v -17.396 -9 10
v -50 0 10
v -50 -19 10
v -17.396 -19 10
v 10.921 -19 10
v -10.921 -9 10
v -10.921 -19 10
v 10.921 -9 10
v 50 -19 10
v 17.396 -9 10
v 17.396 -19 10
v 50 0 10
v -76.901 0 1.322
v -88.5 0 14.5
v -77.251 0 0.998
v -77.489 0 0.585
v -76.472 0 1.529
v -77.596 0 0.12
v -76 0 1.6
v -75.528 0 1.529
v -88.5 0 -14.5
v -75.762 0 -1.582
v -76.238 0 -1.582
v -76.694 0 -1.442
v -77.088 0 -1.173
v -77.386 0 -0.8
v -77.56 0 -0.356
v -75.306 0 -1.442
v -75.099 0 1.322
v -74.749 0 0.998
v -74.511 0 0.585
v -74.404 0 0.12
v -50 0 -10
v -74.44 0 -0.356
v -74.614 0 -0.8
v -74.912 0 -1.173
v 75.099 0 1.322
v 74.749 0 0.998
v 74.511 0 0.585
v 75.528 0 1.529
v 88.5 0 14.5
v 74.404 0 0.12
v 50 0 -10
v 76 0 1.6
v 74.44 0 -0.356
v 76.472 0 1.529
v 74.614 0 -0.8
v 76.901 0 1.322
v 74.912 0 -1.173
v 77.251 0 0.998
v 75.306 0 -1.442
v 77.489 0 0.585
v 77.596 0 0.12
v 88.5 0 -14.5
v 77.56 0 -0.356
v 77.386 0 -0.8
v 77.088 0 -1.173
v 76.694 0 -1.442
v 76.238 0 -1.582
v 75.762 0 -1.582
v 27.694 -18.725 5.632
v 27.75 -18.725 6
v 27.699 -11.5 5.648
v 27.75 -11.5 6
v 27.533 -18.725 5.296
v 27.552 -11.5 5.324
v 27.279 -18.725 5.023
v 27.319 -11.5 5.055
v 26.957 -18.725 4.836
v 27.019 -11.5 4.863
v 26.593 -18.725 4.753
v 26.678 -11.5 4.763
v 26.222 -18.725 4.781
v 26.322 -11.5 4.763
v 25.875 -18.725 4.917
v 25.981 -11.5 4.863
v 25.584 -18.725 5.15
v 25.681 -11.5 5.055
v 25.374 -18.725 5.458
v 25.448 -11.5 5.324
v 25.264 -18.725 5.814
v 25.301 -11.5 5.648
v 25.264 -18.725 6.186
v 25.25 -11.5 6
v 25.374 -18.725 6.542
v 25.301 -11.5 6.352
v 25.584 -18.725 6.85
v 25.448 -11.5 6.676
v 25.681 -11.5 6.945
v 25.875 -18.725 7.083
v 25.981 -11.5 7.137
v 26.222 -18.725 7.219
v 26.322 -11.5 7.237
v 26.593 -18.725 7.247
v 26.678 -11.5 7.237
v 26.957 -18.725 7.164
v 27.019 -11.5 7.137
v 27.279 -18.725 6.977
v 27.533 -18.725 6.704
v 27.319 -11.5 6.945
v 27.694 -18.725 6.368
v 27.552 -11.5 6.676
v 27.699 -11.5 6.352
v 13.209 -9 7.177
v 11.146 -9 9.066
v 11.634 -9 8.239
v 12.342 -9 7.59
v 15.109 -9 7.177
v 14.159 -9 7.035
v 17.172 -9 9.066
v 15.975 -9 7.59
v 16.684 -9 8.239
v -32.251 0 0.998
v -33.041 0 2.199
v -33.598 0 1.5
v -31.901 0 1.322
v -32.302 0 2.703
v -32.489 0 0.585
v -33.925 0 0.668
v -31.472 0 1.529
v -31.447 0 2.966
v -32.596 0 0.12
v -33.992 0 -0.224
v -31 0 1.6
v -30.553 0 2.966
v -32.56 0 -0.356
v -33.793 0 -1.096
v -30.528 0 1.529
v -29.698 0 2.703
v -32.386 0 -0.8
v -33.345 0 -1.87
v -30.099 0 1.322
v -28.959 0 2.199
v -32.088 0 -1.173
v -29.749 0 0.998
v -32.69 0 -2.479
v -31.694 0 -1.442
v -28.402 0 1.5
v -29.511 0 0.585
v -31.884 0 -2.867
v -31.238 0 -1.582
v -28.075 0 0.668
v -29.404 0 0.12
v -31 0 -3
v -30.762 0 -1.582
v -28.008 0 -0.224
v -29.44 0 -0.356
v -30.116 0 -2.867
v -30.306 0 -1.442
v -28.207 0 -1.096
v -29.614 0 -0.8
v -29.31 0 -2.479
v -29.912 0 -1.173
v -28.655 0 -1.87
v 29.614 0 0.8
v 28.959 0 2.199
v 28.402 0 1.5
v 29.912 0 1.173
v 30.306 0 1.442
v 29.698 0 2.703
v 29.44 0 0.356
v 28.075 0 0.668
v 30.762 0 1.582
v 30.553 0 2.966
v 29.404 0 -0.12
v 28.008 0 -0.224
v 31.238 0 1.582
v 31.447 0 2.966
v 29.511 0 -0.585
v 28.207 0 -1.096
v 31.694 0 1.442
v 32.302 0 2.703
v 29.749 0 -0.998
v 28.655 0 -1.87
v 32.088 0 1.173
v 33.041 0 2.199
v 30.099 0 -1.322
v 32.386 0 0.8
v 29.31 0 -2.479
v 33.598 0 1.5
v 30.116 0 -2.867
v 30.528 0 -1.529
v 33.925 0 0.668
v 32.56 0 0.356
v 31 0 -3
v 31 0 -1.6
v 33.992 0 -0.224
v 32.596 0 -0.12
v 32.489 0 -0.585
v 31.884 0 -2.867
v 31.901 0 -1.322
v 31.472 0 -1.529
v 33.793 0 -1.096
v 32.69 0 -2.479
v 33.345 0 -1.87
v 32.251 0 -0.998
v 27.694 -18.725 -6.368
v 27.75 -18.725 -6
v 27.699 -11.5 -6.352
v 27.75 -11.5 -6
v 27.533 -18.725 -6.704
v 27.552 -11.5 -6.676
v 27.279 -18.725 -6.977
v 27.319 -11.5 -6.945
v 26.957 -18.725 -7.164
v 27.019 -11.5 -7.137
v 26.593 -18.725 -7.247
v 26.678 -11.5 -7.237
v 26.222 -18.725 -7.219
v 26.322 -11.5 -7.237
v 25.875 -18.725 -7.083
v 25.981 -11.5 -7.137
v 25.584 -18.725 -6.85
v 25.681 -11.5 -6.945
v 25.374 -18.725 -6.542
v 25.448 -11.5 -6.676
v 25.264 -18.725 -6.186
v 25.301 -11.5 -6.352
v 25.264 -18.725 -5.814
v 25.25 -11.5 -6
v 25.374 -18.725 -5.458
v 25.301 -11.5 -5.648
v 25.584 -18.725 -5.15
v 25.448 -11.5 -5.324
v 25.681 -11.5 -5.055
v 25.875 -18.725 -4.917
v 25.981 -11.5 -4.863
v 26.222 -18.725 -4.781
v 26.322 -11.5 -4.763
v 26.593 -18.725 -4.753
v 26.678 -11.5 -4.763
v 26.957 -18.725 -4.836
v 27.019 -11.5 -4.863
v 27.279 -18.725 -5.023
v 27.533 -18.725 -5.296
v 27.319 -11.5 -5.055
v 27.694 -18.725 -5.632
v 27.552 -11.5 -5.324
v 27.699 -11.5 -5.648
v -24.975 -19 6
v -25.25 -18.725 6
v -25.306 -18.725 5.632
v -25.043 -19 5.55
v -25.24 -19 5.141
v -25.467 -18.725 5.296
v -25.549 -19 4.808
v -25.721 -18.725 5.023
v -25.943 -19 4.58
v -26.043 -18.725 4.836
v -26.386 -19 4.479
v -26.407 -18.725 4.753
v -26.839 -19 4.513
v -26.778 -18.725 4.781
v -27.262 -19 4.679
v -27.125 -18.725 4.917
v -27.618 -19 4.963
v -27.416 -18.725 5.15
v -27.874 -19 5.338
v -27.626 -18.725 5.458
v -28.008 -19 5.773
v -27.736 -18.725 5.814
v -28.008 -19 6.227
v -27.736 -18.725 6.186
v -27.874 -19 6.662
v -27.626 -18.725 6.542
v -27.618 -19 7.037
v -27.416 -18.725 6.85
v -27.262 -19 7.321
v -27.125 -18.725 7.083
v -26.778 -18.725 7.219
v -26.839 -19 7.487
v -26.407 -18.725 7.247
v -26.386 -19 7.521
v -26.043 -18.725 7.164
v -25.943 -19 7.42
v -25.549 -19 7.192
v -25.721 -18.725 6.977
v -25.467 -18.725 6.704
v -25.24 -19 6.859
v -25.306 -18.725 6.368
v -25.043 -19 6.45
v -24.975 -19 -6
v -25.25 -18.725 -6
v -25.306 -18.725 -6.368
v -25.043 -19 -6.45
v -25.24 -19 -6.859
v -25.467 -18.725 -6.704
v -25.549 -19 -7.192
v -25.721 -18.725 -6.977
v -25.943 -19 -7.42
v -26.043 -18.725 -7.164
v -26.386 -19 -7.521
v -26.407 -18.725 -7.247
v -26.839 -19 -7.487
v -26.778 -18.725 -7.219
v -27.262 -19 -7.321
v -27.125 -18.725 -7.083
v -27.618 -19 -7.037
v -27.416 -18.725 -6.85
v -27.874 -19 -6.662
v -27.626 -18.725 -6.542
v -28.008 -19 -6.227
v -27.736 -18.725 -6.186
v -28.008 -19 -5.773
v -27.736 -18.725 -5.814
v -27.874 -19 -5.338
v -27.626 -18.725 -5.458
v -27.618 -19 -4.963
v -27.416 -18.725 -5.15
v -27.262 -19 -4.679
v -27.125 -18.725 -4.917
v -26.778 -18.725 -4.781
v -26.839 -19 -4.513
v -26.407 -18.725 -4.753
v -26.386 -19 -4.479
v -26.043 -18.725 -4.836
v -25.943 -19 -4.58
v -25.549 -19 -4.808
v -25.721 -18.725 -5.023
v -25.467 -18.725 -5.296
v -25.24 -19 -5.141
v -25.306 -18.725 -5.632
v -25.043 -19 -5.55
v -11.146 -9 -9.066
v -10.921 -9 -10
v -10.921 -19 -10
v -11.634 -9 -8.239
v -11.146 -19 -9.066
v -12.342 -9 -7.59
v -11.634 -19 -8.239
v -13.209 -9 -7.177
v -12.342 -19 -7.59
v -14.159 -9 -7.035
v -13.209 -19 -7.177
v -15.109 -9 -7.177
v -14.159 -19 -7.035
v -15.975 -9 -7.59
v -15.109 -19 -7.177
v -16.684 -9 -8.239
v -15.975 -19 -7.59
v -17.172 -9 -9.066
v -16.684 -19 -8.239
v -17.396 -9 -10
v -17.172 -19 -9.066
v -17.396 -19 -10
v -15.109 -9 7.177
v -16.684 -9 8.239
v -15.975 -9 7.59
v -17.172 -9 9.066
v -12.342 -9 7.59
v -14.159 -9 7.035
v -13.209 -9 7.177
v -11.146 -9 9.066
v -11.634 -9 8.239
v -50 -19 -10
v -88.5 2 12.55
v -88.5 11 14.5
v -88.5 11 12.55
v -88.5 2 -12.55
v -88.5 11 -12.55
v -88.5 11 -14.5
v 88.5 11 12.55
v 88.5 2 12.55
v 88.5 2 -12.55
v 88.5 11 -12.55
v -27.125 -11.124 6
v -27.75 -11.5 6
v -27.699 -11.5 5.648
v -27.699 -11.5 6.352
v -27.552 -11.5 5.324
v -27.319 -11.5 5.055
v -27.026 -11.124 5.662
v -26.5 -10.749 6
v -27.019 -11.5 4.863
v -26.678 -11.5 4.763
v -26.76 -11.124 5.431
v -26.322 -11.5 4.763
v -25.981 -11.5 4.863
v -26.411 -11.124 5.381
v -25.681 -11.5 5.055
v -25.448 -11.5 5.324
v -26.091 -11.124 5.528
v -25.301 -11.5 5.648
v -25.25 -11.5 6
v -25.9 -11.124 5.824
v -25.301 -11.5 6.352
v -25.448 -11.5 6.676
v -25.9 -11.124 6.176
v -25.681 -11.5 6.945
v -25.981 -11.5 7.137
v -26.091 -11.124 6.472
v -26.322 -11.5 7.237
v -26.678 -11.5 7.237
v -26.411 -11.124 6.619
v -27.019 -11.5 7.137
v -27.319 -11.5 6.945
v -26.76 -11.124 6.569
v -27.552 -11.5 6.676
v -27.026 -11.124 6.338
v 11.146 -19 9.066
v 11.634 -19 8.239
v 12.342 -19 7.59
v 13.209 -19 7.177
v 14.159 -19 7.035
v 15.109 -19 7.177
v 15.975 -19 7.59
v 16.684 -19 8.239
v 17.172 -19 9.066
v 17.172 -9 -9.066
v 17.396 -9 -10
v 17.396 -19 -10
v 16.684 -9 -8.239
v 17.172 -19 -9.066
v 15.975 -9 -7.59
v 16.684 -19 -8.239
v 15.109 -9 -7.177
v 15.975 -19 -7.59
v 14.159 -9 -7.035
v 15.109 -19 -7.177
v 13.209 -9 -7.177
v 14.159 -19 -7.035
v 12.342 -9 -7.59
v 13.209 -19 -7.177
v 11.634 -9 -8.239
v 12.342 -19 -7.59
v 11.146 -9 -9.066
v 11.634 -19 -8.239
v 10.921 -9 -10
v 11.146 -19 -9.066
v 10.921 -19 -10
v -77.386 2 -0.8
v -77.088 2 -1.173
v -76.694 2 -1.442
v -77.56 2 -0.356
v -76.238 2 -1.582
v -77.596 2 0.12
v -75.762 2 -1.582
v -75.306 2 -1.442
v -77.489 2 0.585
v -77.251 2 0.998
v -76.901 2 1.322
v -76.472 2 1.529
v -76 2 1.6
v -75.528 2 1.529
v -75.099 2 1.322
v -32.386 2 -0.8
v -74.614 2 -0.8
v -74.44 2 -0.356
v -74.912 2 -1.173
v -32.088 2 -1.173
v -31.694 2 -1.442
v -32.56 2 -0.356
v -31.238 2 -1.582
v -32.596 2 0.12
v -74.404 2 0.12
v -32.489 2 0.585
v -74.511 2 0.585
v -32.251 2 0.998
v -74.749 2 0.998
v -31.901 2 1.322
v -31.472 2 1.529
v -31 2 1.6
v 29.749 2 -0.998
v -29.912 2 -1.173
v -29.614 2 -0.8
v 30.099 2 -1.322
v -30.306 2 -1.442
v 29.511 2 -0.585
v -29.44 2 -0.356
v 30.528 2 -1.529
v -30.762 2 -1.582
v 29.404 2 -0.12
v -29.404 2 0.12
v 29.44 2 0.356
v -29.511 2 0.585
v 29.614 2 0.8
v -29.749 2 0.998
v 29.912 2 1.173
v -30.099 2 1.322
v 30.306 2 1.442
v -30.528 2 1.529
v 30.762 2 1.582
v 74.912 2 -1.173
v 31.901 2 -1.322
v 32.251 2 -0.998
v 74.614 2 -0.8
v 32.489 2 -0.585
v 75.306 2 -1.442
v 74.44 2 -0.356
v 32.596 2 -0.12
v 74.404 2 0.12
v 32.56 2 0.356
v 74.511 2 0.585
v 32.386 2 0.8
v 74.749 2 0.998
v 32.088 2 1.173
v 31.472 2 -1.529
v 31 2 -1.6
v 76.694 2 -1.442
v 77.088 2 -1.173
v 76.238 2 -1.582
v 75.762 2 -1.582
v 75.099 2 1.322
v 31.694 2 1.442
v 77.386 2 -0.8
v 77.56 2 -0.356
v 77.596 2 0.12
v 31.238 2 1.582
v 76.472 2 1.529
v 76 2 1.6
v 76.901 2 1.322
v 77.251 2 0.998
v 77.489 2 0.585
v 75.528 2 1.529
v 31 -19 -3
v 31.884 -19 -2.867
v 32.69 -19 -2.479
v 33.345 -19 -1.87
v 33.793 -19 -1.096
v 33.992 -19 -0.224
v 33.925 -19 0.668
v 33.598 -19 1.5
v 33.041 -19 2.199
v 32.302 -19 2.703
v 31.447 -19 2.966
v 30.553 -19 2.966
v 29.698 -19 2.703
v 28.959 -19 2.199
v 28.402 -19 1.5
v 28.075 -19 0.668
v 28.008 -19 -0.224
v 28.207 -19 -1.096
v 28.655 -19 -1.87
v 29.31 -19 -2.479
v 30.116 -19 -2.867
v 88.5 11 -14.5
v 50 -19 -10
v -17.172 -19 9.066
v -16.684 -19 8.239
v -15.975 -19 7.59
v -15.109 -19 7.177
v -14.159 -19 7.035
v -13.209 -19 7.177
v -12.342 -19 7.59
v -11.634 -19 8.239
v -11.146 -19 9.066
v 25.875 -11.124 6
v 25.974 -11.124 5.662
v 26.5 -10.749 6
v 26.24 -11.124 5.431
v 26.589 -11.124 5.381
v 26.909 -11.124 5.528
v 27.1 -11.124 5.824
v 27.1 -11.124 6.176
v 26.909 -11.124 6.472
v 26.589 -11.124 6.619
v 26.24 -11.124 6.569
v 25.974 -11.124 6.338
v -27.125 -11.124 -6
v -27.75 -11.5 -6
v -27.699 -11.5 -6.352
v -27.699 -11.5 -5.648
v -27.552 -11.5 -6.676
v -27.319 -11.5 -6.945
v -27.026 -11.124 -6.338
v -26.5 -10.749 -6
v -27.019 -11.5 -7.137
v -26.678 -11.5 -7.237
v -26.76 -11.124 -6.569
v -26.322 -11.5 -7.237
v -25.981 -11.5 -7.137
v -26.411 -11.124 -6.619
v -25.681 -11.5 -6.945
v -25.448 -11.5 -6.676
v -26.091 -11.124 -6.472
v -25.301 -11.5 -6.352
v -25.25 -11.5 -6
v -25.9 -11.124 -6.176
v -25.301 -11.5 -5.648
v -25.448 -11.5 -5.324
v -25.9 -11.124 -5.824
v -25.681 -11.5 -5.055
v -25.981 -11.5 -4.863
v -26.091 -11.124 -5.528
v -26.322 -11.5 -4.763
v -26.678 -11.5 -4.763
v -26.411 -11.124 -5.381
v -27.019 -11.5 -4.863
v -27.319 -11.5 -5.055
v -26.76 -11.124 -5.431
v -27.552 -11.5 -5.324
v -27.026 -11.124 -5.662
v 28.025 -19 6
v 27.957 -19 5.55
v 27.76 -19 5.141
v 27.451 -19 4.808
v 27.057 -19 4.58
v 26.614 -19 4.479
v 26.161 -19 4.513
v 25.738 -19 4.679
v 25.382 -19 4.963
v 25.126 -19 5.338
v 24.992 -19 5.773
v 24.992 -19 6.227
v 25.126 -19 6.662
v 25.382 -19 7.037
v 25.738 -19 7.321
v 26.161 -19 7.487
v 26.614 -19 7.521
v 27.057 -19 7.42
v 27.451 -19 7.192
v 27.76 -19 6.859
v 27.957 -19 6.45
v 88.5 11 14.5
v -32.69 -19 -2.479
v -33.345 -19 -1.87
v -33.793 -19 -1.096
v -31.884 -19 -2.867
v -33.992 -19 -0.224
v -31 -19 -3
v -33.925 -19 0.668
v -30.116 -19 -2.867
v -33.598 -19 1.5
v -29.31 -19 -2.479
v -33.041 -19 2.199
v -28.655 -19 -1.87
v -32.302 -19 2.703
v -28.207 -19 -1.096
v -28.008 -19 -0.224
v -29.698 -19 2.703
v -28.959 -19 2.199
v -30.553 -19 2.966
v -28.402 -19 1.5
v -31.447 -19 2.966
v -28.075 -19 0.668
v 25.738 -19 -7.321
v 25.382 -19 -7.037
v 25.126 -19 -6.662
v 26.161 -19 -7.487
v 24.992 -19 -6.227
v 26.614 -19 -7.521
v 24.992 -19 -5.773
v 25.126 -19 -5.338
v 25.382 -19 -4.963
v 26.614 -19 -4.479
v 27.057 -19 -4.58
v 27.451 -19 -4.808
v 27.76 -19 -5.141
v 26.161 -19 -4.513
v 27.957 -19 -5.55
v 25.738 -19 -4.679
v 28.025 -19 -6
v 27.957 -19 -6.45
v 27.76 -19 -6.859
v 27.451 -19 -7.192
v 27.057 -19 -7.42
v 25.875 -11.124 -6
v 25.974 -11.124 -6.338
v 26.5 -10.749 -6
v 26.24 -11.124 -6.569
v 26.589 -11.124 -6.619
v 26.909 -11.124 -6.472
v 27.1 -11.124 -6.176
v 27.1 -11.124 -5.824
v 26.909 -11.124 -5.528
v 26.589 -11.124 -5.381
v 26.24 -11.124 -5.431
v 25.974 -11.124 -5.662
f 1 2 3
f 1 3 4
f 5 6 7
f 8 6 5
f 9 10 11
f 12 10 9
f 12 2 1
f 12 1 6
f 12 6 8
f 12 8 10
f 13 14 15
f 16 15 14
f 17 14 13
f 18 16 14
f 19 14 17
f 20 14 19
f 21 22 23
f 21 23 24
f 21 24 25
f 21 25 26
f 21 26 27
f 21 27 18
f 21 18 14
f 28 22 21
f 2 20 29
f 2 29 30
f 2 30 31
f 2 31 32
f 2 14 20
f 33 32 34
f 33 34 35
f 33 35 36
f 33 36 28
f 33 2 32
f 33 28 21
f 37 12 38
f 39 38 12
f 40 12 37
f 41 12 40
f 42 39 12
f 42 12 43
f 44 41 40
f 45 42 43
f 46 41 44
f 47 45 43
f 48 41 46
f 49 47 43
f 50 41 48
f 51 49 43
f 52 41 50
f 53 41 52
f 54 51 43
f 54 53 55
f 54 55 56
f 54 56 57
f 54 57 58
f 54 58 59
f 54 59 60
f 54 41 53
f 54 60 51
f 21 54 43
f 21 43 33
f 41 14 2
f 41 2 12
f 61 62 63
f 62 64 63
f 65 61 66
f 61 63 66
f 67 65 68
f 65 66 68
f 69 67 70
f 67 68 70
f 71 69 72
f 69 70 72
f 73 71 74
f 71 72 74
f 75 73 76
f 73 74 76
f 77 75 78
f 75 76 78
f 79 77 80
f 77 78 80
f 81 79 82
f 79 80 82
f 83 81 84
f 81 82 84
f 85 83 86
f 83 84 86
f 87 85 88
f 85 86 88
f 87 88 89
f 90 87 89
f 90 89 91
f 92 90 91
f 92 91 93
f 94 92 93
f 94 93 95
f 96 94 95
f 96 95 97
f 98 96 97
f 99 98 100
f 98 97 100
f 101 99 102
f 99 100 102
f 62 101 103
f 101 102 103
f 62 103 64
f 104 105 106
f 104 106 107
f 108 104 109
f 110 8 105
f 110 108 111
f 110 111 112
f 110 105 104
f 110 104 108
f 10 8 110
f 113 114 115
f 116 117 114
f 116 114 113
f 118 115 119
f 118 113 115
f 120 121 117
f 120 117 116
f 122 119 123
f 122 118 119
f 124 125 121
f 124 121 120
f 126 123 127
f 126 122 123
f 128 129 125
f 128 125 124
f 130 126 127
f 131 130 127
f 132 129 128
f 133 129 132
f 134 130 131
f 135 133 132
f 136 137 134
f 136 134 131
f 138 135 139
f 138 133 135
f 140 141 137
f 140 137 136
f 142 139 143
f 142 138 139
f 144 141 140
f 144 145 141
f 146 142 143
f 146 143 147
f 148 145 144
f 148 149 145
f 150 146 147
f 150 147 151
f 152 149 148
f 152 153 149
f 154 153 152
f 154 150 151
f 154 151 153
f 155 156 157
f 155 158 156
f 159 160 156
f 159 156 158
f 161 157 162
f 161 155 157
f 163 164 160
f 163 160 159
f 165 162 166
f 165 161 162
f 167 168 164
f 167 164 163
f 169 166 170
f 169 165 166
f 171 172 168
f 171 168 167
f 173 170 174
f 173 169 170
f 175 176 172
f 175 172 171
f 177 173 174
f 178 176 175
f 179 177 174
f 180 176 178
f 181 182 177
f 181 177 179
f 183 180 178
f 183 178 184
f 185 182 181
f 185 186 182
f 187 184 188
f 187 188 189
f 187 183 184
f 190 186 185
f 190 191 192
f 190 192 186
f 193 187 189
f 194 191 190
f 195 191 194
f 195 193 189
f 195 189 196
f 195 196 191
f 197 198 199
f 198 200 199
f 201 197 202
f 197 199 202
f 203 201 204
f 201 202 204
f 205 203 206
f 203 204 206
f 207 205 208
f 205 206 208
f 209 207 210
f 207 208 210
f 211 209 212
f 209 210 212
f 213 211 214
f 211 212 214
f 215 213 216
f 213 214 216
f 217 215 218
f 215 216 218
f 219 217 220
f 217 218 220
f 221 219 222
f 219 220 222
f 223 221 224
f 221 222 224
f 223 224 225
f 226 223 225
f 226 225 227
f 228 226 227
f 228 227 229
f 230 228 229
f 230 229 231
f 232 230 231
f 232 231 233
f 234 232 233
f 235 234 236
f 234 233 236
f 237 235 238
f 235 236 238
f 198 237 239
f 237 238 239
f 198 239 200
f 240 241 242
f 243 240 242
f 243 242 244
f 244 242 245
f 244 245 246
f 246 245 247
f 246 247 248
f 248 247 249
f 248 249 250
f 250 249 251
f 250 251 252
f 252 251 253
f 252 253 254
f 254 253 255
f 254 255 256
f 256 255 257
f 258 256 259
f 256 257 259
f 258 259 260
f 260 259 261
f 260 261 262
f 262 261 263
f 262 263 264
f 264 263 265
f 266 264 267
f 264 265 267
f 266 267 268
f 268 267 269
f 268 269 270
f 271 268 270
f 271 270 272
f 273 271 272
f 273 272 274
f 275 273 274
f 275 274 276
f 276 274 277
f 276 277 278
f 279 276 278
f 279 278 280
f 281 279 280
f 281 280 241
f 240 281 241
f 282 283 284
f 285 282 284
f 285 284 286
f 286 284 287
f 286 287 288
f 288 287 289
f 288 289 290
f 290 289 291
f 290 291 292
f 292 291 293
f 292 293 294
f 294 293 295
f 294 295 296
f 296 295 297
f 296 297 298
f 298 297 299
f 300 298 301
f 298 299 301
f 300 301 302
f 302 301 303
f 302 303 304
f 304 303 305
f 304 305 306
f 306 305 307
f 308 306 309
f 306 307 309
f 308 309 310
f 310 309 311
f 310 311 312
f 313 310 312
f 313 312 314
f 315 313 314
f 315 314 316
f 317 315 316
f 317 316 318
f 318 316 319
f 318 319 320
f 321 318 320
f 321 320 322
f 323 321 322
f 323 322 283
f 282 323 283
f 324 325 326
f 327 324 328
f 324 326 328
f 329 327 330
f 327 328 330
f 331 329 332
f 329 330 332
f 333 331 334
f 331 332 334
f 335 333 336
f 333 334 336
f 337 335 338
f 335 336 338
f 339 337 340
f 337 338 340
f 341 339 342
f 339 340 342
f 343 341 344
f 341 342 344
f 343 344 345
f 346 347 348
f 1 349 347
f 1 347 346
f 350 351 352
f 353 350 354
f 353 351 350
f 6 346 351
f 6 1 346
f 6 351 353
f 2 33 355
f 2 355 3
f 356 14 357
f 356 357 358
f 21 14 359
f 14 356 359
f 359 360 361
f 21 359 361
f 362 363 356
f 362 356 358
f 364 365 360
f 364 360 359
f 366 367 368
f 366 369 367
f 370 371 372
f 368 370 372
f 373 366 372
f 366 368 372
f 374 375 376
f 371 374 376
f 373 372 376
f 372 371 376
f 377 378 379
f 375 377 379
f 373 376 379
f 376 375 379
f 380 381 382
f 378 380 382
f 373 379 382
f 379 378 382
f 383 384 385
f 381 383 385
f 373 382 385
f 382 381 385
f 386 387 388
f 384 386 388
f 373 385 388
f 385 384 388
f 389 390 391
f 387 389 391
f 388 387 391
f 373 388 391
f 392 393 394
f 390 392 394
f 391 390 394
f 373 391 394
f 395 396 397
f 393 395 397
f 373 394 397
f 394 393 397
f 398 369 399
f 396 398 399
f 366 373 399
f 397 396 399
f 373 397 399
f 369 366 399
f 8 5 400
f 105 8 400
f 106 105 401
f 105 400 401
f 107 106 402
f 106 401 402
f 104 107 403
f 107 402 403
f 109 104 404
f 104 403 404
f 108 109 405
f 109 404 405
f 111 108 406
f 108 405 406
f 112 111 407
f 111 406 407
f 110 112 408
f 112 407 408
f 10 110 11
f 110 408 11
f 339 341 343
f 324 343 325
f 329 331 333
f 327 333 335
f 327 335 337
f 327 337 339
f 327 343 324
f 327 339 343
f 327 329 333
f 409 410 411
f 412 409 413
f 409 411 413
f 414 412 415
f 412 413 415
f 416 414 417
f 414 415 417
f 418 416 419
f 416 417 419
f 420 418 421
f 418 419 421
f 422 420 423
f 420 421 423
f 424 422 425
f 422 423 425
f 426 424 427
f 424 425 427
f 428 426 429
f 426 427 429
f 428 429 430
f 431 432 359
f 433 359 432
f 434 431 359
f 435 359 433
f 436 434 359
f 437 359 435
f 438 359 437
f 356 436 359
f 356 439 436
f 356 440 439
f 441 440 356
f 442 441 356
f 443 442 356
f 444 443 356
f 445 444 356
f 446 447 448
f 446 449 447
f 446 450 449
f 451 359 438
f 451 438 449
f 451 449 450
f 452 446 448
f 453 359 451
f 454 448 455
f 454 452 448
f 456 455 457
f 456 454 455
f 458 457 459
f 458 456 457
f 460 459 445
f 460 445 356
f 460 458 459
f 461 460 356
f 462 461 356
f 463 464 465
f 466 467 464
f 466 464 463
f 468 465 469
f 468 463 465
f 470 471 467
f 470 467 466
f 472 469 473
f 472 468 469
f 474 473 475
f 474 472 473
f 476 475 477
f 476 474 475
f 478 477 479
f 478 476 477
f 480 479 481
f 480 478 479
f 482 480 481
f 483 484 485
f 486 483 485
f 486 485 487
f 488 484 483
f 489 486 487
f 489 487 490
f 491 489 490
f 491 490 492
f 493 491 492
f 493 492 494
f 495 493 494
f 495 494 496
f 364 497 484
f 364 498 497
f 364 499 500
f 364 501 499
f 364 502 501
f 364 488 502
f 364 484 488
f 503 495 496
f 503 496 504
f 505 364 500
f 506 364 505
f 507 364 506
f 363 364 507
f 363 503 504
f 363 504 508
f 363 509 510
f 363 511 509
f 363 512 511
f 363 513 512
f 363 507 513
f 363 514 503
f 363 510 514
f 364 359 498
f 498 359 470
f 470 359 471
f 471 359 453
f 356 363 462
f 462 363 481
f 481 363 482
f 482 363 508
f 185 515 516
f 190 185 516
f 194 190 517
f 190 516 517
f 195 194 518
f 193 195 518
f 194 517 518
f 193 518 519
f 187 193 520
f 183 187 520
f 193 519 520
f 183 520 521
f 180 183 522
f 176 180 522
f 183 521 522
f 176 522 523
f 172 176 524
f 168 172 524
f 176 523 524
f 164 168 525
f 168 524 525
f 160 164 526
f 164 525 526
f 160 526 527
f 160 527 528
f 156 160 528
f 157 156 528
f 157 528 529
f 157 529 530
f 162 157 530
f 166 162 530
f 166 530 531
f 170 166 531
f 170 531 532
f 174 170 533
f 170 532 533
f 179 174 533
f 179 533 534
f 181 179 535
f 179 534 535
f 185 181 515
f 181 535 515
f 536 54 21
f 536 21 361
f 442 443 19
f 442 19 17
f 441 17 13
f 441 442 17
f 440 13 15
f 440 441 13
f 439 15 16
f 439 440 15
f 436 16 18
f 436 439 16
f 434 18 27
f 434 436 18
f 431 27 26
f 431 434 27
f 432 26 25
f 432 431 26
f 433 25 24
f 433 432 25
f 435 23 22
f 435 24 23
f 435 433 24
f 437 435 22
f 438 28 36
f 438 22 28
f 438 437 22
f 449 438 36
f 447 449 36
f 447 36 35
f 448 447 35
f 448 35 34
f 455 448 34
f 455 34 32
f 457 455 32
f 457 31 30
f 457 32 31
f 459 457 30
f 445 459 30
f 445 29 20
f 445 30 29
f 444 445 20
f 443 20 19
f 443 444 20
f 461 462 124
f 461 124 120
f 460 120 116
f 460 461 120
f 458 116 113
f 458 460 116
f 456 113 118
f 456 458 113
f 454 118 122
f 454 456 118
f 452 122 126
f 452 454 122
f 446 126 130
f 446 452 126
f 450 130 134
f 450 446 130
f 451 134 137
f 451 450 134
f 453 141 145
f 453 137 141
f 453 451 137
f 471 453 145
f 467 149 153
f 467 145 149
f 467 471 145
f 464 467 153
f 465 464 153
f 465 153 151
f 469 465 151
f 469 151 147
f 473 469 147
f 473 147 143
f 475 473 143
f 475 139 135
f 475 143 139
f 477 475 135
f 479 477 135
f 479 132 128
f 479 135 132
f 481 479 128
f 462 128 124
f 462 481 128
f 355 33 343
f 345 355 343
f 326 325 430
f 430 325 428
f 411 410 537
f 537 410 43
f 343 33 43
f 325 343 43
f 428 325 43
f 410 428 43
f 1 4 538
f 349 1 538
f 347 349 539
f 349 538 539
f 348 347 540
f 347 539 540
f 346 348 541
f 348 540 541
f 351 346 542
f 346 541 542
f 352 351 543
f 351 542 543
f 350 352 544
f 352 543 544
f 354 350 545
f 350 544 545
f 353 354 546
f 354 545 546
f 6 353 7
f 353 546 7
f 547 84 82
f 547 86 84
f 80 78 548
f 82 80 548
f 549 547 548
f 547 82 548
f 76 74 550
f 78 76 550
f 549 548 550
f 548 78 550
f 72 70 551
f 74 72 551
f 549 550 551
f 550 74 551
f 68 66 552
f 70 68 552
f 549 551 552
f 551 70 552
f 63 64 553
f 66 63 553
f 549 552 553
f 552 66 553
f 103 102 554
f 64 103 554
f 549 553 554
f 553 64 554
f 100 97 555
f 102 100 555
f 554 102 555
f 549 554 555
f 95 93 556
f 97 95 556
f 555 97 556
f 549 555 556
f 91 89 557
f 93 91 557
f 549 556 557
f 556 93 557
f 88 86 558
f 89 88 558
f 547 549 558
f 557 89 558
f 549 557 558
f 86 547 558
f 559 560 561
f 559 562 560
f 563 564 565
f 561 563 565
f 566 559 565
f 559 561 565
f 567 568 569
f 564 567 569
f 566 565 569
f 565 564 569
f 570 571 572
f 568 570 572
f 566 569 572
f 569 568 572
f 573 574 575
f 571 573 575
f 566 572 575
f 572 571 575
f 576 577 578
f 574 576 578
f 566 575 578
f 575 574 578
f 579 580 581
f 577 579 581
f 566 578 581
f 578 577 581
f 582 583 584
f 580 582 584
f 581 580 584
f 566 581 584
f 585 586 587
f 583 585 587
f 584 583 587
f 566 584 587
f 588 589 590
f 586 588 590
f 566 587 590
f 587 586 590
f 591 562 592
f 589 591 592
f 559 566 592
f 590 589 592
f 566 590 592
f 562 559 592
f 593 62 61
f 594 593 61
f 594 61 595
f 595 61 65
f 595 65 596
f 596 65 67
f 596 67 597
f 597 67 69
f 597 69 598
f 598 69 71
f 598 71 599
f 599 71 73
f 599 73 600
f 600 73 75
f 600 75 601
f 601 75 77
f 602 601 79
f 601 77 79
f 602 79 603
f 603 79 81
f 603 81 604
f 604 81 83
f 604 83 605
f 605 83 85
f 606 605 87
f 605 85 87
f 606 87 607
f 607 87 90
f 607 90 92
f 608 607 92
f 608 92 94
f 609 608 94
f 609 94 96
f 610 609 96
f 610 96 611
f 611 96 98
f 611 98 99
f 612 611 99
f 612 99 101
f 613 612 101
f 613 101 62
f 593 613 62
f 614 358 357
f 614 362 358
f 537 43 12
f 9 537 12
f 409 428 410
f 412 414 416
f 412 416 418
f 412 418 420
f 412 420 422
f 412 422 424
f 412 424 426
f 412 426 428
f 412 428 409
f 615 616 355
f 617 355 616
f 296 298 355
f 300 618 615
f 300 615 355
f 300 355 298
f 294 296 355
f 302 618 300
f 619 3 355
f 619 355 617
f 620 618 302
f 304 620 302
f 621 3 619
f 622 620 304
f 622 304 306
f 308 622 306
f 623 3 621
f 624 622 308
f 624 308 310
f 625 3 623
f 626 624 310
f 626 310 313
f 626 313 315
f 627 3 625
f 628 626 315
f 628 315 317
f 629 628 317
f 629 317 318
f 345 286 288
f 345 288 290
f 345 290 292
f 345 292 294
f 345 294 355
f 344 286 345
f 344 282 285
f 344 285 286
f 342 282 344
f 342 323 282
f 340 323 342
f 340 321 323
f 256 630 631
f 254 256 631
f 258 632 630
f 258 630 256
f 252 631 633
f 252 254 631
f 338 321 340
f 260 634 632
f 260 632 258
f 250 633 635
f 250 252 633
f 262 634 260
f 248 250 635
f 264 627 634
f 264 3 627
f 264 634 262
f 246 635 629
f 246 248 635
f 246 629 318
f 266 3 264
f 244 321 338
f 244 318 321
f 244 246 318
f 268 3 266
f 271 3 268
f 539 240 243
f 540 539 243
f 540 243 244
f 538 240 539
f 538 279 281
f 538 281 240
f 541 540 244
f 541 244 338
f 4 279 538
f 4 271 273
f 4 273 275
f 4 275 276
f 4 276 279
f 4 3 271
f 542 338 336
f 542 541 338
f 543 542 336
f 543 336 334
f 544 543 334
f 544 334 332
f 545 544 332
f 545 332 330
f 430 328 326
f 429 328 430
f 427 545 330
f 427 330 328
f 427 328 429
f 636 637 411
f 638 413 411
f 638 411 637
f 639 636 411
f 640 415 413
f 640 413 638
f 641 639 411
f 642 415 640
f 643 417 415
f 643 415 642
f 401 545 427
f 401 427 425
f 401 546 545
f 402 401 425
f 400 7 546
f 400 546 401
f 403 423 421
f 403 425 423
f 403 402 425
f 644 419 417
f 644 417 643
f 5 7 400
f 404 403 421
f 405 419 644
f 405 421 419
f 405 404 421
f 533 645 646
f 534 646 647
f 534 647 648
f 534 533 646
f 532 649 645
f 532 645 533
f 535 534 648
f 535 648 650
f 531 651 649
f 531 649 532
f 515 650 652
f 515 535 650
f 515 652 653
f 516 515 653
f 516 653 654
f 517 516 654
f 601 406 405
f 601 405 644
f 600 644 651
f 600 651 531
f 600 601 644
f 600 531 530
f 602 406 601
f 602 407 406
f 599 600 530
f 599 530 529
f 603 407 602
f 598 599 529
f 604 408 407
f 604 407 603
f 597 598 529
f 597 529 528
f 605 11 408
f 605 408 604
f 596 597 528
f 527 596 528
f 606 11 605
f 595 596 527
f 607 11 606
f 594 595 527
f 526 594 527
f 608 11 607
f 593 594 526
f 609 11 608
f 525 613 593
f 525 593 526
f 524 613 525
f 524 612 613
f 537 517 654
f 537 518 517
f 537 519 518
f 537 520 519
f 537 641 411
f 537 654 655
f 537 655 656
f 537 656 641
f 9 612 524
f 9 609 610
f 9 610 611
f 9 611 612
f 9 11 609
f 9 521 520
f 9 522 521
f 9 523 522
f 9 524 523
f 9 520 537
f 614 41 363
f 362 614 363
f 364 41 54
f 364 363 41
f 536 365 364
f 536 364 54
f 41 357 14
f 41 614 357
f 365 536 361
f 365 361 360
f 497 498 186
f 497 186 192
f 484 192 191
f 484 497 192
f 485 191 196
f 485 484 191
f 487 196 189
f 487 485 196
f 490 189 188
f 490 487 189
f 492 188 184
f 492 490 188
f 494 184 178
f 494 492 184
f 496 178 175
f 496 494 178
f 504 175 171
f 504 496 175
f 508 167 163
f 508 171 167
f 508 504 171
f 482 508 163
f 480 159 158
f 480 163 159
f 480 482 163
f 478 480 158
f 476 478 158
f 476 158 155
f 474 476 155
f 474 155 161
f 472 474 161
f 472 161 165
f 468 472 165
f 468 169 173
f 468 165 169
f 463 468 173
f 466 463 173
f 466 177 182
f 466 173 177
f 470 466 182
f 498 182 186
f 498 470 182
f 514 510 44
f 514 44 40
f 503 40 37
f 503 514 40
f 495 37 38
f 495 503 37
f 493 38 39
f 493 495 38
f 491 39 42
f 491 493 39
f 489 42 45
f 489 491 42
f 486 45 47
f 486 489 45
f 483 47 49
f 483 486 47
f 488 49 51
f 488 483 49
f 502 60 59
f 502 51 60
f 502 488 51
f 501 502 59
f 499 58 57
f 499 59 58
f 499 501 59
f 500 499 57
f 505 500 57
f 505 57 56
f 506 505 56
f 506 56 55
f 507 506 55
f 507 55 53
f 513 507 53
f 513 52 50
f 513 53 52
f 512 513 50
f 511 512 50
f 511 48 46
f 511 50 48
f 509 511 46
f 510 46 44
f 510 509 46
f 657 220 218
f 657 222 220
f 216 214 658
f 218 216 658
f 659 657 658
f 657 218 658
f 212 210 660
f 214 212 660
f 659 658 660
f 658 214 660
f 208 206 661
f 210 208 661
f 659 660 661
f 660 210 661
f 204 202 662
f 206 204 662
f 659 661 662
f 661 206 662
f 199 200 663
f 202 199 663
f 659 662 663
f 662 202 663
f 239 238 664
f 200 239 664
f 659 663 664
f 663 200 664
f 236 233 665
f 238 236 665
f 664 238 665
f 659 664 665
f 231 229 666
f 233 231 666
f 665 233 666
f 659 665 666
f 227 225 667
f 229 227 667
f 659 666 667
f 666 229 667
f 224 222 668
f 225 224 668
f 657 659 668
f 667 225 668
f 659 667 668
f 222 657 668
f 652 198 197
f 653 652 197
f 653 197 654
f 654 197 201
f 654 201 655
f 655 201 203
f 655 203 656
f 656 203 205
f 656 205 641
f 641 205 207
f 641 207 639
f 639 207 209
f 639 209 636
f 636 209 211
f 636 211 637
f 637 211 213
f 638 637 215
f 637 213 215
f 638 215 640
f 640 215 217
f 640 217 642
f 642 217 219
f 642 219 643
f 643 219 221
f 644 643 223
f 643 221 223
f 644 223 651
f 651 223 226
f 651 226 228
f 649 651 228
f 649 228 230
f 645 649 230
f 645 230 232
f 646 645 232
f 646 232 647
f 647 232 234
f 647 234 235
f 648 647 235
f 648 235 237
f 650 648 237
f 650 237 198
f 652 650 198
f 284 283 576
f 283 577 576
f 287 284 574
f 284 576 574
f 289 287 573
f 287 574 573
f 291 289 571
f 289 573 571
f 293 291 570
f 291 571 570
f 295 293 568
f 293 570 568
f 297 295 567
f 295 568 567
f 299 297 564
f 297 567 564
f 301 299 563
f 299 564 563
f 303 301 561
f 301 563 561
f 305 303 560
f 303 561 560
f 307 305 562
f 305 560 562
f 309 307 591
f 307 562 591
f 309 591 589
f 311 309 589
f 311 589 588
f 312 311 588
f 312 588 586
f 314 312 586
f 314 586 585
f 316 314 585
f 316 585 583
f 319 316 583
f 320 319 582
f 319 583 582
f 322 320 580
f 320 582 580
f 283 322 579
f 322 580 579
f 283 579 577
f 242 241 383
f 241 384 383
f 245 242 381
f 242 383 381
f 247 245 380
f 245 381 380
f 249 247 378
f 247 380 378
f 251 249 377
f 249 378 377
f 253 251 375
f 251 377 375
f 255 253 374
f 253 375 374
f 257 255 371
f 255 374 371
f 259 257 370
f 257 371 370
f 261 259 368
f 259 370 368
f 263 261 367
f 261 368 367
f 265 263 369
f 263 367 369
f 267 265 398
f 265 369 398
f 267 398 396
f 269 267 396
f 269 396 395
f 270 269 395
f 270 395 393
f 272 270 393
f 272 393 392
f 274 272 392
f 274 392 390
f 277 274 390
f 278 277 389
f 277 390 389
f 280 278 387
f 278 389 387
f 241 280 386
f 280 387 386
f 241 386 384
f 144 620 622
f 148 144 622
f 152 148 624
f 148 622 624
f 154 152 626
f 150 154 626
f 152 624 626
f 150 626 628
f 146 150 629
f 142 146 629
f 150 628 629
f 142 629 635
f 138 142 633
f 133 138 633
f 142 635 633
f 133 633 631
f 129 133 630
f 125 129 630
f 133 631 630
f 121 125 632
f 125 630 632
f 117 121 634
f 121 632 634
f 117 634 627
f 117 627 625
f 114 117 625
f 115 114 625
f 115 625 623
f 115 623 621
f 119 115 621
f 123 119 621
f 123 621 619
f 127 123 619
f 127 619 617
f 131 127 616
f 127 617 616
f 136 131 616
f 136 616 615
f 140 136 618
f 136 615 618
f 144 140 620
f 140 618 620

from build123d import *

# Parameters (mm, degrees)
BOSS_EXTRUDE1_DEPTH             = 88.5
SKETCH3_W                       = 100
SKETCH3_H                       = 20
BOSS_EXTRUDE2_DEPTH             = 19
CUT_EXTRUDE1_DEPTH              = 16
CUT_EXTRUDE1_DEPTH_BACK         = 92.670605976
SKETCH2_R                       = 1.6
SKETCH4_R                       = 3
CUT_EXTRUDE2_DEPTH              = 19
M3X0_5_TAPPED_HOLE1_D           = 2.5
M3X0_5_TAPPED_HOLE1_DEPTH       = 7.5
M3X0_5_TAPPED_HOLE1_CSINK_D     = 3.05
M3X0_5_TAPPED_HOLE1_CSINK_ANGLE = 90
M3X0_5_TAPPED_HOLE1_TIP         = 0.751075774
SKETCH9_R                       = 3.25
CUT_EXTRUDE3_DEPTH              = 10


with BuildPart() as part:
    # Sketch1 → Boss-Extrude1 (new, symmetric)
    with BuildSketch(Plane(origin=(0, 0, 0), x_dir=(0, 0, -1), z_dir=(1, 0, 0))):
        Polygon((-14.5, 0), (14.5, 0), (14.5, 11), (12.55, 11), (12.55, 2), (-12.55, 2), (-12.55, 11), (-14.5, 11), align=None)
    extrude(amount=BOSS_EXTRUDE1_DEPTH, both=True)

    # Sketch3 → Boss-Extrude2 (add)
    with BuildSketch(Plane.XZ):
        Rectangle(SKETCH3_W, SKETCH3_H)
    extrude(amount=BOSS_EXTRUDE2_DEPTH)

    # Sketch2 → Cut-Extrude1 (cut, two sides: drawn at the far end of the back side and taken through both)
    with BuildSketch(Plane.XZ.offset(-CUT_EXTRUDE1_DEPTH_BACK)):
        with Locations(Location((76, 0, 0), (0, 0, 90))):
            Circle(SKETCH2_R)
        with Locations(Location((31, 0, 0), (0, 0, 270))):
            Circle(SKETCH2_R)
        with Locations(Location((-31, 0, 0), (0, 0, 90))):
            Circle(SKETCH2_R)
        with Locations(Location((-76, 0, 0), (0, 0, 90))):
            Circle(SKETCH2_R)
    extrude(amount=CUT_EXTRUDE1_DEPTH + CUT_EXTRUDE1_DEPTH_BACK, mode=Mode.SUBTRACT)

    # Sketch4 → Cut-Extrude2 (cut)
    with BuildSketch(Plane.XZ.offset(19)):
        with Locations(Location((-31, 0, 0), (0, 0, 270))):
            Circle(SKETCH4_R)
        with Locations(Location((31, 0, 0), (0, 0, 270))):
            Circle(SKETCH4_R)
    extrude(amount=-CUT_EXTRUDE2_DEPTH, mode=Mode.SUBTRACT)

    # M3x0.5 Tapped Hole1
    with Locations(Plane(origin=(0, -19, 0), x_dir=(-1, 0, 0), z_dir=(0, -1, 0))):
        with Locations((-26.5, -6), (26.5, 6), (26.5, -6), (-26.5, 6)):
            CounterSinkHole(M3X0_5_TAPPED_HOLE1_D / 2, M3X0_5_TAPPED_HOLE1_CSINK_D / 2, depth=M3X0_5_TAPPED_HOLE1_DEPTH, counter_sink_angle=M3X0_5_TAPPED_HOLE1_CSINK_ANGLE)
            with Locations((0, 0, -(M3X0_5_TAPPED_HOLE1_DEPTH + M3X0_5_TAPPED_HOLE1_TIP / 2))):  # 118° drill point
                Cone(0, M3X0_5_TAPPED_HOLE1_D / 2, M3X0_5_TAPPED_HOLE1_TIP, mode=Mode.SUBTRACT)

    # Sketch9 → Cut-Extrude3 (cut)
    with BuildSketch(Plane.XZ.offset(19)):
        with Locations((14.158699622, -10.285)):
            Circle(SKETCH9_R)
        with Locations((-14.158699622, -10.285)):
            Circle(SKETCH9_R)
        with Locations((-14.158699622, 10.285)):
            Circle(SKETCH9_R)
        with Locations((14.158699622, 10.285)):
            Circle(SKETCH9_R)
    extrude(amount=-CUT_EXTRUDE3_DEPTH, mode=Mode.SUBTRACT)


solid = part.part
